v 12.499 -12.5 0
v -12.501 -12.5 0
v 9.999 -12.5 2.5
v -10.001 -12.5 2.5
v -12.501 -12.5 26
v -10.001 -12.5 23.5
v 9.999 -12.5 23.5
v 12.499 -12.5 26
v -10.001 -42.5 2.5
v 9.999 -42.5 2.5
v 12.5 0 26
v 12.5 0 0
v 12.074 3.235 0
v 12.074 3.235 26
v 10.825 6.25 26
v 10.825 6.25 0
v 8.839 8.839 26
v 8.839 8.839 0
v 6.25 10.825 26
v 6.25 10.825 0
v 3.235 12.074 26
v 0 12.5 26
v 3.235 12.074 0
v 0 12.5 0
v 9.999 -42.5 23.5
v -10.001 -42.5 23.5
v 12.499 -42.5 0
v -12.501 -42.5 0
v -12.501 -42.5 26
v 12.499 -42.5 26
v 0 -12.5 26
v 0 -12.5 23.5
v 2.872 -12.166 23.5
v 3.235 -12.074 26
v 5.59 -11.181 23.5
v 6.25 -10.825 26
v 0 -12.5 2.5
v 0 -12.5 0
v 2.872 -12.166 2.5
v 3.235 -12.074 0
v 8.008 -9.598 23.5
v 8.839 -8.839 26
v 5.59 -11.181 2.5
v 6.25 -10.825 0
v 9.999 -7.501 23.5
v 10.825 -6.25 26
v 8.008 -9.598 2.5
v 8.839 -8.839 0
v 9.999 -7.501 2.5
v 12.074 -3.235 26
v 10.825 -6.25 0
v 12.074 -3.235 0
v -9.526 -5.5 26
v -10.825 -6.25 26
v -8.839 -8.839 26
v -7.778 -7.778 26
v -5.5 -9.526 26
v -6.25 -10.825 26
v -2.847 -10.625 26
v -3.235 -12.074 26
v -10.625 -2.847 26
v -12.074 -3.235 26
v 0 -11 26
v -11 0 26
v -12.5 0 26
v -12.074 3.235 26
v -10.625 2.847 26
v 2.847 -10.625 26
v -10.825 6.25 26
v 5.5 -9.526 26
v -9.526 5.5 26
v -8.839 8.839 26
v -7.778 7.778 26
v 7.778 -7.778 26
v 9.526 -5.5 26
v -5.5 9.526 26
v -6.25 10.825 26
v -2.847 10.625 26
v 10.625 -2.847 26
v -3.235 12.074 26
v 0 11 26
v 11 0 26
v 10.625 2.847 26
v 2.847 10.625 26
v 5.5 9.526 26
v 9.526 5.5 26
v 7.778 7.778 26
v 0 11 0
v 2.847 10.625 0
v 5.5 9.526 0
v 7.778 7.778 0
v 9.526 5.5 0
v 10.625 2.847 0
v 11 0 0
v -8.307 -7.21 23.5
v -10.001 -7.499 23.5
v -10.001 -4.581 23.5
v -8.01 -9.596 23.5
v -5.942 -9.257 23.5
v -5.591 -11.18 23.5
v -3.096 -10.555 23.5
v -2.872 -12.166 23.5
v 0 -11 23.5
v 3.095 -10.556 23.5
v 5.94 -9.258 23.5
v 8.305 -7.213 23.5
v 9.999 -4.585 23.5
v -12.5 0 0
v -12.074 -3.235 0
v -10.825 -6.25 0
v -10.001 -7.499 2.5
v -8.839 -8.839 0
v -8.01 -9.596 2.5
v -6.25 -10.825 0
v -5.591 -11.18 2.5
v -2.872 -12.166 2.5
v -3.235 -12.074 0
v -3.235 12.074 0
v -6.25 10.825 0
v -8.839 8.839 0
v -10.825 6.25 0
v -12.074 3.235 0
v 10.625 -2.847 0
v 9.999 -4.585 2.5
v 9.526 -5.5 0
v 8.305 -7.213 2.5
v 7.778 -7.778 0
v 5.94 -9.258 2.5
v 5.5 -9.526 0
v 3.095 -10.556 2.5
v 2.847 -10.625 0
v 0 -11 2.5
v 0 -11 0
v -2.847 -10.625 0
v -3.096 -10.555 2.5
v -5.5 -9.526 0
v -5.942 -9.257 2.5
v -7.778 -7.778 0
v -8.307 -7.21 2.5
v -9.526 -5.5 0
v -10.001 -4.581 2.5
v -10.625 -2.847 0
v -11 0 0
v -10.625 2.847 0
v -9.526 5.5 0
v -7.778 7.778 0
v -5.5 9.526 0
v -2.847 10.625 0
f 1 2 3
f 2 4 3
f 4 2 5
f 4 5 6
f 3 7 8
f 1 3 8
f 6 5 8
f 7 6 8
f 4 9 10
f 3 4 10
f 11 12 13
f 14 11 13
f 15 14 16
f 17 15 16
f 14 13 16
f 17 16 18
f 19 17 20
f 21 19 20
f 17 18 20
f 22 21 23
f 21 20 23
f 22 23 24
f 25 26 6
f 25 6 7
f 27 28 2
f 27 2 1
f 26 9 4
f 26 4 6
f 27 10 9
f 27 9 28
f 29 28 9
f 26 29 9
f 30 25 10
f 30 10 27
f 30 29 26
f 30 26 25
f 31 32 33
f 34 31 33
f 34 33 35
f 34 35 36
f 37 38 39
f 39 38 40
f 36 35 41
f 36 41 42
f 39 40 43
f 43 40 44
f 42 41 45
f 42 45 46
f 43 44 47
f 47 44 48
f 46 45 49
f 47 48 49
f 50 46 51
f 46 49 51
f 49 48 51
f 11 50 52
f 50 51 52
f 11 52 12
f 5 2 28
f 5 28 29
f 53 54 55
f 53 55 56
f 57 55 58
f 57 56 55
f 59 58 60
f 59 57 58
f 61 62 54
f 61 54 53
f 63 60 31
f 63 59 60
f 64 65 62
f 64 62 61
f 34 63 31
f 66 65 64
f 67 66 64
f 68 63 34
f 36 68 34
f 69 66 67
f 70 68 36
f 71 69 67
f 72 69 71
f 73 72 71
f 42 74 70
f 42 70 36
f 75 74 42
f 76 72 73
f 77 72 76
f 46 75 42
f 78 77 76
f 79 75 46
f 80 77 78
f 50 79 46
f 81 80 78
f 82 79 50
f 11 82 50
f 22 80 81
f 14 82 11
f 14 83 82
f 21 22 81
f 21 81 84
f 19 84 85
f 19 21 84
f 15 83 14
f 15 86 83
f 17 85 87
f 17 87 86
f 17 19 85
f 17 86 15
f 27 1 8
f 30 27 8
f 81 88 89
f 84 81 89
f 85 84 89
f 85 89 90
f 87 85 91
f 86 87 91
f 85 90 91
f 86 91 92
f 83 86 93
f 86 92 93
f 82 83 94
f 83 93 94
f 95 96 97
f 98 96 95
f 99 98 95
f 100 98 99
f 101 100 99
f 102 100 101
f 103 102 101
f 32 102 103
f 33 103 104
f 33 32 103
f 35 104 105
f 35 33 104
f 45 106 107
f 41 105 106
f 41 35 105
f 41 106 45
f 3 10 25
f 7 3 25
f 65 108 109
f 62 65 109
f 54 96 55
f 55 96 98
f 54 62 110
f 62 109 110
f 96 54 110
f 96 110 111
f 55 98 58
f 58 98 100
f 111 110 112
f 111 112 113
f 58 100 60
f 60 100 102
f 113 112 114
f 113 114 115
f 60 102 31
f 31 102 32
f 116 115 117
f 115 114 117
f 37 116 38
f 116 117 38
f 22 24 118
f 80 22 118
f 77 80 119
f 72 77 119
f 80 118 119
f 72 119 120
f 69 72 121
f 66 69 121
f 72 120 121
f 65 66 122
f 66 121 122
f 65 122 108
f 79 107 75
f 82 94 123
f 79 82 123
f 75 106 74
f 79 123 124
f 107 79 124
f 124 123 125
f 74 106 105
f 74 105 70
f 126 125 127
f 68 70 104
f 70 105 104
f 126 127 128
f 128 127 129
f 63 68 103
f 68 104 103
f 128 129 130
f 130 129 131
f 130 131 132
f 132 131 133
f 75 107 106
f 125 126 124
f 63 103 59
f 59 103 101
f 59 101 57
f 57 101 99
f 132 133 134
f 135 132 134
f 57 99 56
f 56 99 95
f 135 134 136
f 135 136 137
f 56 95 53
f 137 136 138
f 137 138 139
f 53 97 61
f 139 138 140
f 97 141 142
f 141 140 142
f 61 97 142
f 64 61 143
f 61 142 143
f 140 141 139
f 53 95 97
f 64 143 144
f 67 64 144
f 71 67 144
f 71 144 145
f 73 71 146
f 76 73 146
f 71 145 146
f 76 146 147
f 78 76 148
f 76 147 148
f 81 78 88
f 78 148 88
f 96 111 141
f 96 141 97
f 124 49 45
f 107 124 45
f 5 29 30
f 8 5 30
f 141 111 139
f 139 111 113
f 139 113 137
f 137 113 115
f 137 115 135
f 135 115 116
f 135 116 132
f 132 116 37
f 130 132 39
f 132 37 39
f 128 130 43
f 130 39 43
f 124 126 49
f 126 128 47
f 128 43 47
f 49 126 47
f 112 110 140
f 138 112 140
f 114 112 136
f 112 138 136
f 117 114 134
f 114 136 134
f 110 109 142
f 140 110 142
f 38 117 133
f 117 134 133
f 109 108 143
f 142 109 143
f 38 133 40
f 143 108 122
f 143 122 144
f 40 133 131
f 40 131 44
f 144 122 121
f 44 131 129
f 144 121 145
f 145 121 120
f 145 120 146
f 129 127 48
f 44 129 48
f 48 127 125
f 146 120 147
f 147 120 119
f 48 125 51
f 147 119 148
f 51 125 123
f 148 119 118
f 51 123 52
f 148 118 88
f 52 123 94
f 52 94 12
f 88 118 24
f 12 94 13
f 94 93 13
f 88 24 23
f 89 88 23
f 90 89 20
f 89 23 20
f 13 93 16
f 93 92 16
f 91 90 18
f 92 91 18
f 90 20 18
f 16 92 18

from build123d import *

# Parameters (mm, degrees)
F1_DEPTH = 26
F3_W     = 25
F3_H     = 26
F4_DEPTH = 30
F5_T     = -2.5
F6_DEPTH = 15


with BuildPart() as f1:
    # F0 (on Top) → F1 (new body)
    with BuildSketch(Plane.XY):
        with BuildLine():
            Line((11, 0), (12.5, 0))
            ThreePointArc((12.5, 0), (8.8388347648, 8.8388347648), (0, 12.5))
            Line((0, 12.5), (0, 11))
            ThreePointArc((0, 11), (7.7781745931, 7.7781745931), (11, 0))
        make_face()
        with BuildLine():
            Line((0, 11), (0, 12.5))
            ThreePointArc((0, 12.5), (-8.8388347648, 8.8388347648), (-12.5, 0))
            Line((-12.5, 0), (-11, 0))
            ThreePointArc((-11, 0), (-7.7781745931, 7.7781745931), (0, 11))
        make_face()
        with BuildLine():
            ThreePointArc((-12.5, 0), (-8.8388347648, -8.8388347648), (0, -12.5))
            Line((0, -12.5), (0, -11))
            ThreePointArc((0, -11), (-7.7781745931, -7.7781745931), (-11, 0))
            Line((-11, 0), (-12.5, 0))
        make_face()
        with BuildLine():
            ThreePointArc((0, -12.5), (8.8388347648, -8.8388347648), (12.5, 0))
            Line((12.5, 0), (11, 0))
            ThreePointArc((11, 0), (7.7781745931, -7.7781745931), (0, -11))
            Line((0, -11), (0, -12.5))
        make_face()
    extrude(amount=F1_DEPTH)


with BuildPart() as f4:
    # F3 (on offset) → F4 (new body)
    with BuildSketch(Plane.XZ.offset(12.5)):
        with Locations((-0.0008905306, 13)):
            Rectangle(F3_W, F3_H)
    extrude(amount=F4_DEPTH)

    # F5
    f5_openings = [f4.faces().sort_by_distance(p)[0] for p in [
        (-0.000891, -42.5, 13),
    ]]
    offset(amount=F5_T, openings=f5_openings)


with BuildPart() as f6_tool:
    # F6 (cut): a face of the model
    f6_faces = [f4.part.faces().sort_by_distance(p)[0] for p in [
        (-0.0008905306, -15, 13),
    ]]
    extrude(f6_faces, amount=-F6_DEPTH)


with BuildPart() as f1_1:
    add(f1.part)

    # F6: cut by f6_tool
    add(f6_tool.part, mode=Mode.SUBTRACT)


with BuildPart() as f4_1:
    add(f4.part)

    # F6: cut by f6_tool
    add(f6_tool.part, mode=Mode.SUBTRACT)


solid = Compound([f1_1.part, f4_1.part])
